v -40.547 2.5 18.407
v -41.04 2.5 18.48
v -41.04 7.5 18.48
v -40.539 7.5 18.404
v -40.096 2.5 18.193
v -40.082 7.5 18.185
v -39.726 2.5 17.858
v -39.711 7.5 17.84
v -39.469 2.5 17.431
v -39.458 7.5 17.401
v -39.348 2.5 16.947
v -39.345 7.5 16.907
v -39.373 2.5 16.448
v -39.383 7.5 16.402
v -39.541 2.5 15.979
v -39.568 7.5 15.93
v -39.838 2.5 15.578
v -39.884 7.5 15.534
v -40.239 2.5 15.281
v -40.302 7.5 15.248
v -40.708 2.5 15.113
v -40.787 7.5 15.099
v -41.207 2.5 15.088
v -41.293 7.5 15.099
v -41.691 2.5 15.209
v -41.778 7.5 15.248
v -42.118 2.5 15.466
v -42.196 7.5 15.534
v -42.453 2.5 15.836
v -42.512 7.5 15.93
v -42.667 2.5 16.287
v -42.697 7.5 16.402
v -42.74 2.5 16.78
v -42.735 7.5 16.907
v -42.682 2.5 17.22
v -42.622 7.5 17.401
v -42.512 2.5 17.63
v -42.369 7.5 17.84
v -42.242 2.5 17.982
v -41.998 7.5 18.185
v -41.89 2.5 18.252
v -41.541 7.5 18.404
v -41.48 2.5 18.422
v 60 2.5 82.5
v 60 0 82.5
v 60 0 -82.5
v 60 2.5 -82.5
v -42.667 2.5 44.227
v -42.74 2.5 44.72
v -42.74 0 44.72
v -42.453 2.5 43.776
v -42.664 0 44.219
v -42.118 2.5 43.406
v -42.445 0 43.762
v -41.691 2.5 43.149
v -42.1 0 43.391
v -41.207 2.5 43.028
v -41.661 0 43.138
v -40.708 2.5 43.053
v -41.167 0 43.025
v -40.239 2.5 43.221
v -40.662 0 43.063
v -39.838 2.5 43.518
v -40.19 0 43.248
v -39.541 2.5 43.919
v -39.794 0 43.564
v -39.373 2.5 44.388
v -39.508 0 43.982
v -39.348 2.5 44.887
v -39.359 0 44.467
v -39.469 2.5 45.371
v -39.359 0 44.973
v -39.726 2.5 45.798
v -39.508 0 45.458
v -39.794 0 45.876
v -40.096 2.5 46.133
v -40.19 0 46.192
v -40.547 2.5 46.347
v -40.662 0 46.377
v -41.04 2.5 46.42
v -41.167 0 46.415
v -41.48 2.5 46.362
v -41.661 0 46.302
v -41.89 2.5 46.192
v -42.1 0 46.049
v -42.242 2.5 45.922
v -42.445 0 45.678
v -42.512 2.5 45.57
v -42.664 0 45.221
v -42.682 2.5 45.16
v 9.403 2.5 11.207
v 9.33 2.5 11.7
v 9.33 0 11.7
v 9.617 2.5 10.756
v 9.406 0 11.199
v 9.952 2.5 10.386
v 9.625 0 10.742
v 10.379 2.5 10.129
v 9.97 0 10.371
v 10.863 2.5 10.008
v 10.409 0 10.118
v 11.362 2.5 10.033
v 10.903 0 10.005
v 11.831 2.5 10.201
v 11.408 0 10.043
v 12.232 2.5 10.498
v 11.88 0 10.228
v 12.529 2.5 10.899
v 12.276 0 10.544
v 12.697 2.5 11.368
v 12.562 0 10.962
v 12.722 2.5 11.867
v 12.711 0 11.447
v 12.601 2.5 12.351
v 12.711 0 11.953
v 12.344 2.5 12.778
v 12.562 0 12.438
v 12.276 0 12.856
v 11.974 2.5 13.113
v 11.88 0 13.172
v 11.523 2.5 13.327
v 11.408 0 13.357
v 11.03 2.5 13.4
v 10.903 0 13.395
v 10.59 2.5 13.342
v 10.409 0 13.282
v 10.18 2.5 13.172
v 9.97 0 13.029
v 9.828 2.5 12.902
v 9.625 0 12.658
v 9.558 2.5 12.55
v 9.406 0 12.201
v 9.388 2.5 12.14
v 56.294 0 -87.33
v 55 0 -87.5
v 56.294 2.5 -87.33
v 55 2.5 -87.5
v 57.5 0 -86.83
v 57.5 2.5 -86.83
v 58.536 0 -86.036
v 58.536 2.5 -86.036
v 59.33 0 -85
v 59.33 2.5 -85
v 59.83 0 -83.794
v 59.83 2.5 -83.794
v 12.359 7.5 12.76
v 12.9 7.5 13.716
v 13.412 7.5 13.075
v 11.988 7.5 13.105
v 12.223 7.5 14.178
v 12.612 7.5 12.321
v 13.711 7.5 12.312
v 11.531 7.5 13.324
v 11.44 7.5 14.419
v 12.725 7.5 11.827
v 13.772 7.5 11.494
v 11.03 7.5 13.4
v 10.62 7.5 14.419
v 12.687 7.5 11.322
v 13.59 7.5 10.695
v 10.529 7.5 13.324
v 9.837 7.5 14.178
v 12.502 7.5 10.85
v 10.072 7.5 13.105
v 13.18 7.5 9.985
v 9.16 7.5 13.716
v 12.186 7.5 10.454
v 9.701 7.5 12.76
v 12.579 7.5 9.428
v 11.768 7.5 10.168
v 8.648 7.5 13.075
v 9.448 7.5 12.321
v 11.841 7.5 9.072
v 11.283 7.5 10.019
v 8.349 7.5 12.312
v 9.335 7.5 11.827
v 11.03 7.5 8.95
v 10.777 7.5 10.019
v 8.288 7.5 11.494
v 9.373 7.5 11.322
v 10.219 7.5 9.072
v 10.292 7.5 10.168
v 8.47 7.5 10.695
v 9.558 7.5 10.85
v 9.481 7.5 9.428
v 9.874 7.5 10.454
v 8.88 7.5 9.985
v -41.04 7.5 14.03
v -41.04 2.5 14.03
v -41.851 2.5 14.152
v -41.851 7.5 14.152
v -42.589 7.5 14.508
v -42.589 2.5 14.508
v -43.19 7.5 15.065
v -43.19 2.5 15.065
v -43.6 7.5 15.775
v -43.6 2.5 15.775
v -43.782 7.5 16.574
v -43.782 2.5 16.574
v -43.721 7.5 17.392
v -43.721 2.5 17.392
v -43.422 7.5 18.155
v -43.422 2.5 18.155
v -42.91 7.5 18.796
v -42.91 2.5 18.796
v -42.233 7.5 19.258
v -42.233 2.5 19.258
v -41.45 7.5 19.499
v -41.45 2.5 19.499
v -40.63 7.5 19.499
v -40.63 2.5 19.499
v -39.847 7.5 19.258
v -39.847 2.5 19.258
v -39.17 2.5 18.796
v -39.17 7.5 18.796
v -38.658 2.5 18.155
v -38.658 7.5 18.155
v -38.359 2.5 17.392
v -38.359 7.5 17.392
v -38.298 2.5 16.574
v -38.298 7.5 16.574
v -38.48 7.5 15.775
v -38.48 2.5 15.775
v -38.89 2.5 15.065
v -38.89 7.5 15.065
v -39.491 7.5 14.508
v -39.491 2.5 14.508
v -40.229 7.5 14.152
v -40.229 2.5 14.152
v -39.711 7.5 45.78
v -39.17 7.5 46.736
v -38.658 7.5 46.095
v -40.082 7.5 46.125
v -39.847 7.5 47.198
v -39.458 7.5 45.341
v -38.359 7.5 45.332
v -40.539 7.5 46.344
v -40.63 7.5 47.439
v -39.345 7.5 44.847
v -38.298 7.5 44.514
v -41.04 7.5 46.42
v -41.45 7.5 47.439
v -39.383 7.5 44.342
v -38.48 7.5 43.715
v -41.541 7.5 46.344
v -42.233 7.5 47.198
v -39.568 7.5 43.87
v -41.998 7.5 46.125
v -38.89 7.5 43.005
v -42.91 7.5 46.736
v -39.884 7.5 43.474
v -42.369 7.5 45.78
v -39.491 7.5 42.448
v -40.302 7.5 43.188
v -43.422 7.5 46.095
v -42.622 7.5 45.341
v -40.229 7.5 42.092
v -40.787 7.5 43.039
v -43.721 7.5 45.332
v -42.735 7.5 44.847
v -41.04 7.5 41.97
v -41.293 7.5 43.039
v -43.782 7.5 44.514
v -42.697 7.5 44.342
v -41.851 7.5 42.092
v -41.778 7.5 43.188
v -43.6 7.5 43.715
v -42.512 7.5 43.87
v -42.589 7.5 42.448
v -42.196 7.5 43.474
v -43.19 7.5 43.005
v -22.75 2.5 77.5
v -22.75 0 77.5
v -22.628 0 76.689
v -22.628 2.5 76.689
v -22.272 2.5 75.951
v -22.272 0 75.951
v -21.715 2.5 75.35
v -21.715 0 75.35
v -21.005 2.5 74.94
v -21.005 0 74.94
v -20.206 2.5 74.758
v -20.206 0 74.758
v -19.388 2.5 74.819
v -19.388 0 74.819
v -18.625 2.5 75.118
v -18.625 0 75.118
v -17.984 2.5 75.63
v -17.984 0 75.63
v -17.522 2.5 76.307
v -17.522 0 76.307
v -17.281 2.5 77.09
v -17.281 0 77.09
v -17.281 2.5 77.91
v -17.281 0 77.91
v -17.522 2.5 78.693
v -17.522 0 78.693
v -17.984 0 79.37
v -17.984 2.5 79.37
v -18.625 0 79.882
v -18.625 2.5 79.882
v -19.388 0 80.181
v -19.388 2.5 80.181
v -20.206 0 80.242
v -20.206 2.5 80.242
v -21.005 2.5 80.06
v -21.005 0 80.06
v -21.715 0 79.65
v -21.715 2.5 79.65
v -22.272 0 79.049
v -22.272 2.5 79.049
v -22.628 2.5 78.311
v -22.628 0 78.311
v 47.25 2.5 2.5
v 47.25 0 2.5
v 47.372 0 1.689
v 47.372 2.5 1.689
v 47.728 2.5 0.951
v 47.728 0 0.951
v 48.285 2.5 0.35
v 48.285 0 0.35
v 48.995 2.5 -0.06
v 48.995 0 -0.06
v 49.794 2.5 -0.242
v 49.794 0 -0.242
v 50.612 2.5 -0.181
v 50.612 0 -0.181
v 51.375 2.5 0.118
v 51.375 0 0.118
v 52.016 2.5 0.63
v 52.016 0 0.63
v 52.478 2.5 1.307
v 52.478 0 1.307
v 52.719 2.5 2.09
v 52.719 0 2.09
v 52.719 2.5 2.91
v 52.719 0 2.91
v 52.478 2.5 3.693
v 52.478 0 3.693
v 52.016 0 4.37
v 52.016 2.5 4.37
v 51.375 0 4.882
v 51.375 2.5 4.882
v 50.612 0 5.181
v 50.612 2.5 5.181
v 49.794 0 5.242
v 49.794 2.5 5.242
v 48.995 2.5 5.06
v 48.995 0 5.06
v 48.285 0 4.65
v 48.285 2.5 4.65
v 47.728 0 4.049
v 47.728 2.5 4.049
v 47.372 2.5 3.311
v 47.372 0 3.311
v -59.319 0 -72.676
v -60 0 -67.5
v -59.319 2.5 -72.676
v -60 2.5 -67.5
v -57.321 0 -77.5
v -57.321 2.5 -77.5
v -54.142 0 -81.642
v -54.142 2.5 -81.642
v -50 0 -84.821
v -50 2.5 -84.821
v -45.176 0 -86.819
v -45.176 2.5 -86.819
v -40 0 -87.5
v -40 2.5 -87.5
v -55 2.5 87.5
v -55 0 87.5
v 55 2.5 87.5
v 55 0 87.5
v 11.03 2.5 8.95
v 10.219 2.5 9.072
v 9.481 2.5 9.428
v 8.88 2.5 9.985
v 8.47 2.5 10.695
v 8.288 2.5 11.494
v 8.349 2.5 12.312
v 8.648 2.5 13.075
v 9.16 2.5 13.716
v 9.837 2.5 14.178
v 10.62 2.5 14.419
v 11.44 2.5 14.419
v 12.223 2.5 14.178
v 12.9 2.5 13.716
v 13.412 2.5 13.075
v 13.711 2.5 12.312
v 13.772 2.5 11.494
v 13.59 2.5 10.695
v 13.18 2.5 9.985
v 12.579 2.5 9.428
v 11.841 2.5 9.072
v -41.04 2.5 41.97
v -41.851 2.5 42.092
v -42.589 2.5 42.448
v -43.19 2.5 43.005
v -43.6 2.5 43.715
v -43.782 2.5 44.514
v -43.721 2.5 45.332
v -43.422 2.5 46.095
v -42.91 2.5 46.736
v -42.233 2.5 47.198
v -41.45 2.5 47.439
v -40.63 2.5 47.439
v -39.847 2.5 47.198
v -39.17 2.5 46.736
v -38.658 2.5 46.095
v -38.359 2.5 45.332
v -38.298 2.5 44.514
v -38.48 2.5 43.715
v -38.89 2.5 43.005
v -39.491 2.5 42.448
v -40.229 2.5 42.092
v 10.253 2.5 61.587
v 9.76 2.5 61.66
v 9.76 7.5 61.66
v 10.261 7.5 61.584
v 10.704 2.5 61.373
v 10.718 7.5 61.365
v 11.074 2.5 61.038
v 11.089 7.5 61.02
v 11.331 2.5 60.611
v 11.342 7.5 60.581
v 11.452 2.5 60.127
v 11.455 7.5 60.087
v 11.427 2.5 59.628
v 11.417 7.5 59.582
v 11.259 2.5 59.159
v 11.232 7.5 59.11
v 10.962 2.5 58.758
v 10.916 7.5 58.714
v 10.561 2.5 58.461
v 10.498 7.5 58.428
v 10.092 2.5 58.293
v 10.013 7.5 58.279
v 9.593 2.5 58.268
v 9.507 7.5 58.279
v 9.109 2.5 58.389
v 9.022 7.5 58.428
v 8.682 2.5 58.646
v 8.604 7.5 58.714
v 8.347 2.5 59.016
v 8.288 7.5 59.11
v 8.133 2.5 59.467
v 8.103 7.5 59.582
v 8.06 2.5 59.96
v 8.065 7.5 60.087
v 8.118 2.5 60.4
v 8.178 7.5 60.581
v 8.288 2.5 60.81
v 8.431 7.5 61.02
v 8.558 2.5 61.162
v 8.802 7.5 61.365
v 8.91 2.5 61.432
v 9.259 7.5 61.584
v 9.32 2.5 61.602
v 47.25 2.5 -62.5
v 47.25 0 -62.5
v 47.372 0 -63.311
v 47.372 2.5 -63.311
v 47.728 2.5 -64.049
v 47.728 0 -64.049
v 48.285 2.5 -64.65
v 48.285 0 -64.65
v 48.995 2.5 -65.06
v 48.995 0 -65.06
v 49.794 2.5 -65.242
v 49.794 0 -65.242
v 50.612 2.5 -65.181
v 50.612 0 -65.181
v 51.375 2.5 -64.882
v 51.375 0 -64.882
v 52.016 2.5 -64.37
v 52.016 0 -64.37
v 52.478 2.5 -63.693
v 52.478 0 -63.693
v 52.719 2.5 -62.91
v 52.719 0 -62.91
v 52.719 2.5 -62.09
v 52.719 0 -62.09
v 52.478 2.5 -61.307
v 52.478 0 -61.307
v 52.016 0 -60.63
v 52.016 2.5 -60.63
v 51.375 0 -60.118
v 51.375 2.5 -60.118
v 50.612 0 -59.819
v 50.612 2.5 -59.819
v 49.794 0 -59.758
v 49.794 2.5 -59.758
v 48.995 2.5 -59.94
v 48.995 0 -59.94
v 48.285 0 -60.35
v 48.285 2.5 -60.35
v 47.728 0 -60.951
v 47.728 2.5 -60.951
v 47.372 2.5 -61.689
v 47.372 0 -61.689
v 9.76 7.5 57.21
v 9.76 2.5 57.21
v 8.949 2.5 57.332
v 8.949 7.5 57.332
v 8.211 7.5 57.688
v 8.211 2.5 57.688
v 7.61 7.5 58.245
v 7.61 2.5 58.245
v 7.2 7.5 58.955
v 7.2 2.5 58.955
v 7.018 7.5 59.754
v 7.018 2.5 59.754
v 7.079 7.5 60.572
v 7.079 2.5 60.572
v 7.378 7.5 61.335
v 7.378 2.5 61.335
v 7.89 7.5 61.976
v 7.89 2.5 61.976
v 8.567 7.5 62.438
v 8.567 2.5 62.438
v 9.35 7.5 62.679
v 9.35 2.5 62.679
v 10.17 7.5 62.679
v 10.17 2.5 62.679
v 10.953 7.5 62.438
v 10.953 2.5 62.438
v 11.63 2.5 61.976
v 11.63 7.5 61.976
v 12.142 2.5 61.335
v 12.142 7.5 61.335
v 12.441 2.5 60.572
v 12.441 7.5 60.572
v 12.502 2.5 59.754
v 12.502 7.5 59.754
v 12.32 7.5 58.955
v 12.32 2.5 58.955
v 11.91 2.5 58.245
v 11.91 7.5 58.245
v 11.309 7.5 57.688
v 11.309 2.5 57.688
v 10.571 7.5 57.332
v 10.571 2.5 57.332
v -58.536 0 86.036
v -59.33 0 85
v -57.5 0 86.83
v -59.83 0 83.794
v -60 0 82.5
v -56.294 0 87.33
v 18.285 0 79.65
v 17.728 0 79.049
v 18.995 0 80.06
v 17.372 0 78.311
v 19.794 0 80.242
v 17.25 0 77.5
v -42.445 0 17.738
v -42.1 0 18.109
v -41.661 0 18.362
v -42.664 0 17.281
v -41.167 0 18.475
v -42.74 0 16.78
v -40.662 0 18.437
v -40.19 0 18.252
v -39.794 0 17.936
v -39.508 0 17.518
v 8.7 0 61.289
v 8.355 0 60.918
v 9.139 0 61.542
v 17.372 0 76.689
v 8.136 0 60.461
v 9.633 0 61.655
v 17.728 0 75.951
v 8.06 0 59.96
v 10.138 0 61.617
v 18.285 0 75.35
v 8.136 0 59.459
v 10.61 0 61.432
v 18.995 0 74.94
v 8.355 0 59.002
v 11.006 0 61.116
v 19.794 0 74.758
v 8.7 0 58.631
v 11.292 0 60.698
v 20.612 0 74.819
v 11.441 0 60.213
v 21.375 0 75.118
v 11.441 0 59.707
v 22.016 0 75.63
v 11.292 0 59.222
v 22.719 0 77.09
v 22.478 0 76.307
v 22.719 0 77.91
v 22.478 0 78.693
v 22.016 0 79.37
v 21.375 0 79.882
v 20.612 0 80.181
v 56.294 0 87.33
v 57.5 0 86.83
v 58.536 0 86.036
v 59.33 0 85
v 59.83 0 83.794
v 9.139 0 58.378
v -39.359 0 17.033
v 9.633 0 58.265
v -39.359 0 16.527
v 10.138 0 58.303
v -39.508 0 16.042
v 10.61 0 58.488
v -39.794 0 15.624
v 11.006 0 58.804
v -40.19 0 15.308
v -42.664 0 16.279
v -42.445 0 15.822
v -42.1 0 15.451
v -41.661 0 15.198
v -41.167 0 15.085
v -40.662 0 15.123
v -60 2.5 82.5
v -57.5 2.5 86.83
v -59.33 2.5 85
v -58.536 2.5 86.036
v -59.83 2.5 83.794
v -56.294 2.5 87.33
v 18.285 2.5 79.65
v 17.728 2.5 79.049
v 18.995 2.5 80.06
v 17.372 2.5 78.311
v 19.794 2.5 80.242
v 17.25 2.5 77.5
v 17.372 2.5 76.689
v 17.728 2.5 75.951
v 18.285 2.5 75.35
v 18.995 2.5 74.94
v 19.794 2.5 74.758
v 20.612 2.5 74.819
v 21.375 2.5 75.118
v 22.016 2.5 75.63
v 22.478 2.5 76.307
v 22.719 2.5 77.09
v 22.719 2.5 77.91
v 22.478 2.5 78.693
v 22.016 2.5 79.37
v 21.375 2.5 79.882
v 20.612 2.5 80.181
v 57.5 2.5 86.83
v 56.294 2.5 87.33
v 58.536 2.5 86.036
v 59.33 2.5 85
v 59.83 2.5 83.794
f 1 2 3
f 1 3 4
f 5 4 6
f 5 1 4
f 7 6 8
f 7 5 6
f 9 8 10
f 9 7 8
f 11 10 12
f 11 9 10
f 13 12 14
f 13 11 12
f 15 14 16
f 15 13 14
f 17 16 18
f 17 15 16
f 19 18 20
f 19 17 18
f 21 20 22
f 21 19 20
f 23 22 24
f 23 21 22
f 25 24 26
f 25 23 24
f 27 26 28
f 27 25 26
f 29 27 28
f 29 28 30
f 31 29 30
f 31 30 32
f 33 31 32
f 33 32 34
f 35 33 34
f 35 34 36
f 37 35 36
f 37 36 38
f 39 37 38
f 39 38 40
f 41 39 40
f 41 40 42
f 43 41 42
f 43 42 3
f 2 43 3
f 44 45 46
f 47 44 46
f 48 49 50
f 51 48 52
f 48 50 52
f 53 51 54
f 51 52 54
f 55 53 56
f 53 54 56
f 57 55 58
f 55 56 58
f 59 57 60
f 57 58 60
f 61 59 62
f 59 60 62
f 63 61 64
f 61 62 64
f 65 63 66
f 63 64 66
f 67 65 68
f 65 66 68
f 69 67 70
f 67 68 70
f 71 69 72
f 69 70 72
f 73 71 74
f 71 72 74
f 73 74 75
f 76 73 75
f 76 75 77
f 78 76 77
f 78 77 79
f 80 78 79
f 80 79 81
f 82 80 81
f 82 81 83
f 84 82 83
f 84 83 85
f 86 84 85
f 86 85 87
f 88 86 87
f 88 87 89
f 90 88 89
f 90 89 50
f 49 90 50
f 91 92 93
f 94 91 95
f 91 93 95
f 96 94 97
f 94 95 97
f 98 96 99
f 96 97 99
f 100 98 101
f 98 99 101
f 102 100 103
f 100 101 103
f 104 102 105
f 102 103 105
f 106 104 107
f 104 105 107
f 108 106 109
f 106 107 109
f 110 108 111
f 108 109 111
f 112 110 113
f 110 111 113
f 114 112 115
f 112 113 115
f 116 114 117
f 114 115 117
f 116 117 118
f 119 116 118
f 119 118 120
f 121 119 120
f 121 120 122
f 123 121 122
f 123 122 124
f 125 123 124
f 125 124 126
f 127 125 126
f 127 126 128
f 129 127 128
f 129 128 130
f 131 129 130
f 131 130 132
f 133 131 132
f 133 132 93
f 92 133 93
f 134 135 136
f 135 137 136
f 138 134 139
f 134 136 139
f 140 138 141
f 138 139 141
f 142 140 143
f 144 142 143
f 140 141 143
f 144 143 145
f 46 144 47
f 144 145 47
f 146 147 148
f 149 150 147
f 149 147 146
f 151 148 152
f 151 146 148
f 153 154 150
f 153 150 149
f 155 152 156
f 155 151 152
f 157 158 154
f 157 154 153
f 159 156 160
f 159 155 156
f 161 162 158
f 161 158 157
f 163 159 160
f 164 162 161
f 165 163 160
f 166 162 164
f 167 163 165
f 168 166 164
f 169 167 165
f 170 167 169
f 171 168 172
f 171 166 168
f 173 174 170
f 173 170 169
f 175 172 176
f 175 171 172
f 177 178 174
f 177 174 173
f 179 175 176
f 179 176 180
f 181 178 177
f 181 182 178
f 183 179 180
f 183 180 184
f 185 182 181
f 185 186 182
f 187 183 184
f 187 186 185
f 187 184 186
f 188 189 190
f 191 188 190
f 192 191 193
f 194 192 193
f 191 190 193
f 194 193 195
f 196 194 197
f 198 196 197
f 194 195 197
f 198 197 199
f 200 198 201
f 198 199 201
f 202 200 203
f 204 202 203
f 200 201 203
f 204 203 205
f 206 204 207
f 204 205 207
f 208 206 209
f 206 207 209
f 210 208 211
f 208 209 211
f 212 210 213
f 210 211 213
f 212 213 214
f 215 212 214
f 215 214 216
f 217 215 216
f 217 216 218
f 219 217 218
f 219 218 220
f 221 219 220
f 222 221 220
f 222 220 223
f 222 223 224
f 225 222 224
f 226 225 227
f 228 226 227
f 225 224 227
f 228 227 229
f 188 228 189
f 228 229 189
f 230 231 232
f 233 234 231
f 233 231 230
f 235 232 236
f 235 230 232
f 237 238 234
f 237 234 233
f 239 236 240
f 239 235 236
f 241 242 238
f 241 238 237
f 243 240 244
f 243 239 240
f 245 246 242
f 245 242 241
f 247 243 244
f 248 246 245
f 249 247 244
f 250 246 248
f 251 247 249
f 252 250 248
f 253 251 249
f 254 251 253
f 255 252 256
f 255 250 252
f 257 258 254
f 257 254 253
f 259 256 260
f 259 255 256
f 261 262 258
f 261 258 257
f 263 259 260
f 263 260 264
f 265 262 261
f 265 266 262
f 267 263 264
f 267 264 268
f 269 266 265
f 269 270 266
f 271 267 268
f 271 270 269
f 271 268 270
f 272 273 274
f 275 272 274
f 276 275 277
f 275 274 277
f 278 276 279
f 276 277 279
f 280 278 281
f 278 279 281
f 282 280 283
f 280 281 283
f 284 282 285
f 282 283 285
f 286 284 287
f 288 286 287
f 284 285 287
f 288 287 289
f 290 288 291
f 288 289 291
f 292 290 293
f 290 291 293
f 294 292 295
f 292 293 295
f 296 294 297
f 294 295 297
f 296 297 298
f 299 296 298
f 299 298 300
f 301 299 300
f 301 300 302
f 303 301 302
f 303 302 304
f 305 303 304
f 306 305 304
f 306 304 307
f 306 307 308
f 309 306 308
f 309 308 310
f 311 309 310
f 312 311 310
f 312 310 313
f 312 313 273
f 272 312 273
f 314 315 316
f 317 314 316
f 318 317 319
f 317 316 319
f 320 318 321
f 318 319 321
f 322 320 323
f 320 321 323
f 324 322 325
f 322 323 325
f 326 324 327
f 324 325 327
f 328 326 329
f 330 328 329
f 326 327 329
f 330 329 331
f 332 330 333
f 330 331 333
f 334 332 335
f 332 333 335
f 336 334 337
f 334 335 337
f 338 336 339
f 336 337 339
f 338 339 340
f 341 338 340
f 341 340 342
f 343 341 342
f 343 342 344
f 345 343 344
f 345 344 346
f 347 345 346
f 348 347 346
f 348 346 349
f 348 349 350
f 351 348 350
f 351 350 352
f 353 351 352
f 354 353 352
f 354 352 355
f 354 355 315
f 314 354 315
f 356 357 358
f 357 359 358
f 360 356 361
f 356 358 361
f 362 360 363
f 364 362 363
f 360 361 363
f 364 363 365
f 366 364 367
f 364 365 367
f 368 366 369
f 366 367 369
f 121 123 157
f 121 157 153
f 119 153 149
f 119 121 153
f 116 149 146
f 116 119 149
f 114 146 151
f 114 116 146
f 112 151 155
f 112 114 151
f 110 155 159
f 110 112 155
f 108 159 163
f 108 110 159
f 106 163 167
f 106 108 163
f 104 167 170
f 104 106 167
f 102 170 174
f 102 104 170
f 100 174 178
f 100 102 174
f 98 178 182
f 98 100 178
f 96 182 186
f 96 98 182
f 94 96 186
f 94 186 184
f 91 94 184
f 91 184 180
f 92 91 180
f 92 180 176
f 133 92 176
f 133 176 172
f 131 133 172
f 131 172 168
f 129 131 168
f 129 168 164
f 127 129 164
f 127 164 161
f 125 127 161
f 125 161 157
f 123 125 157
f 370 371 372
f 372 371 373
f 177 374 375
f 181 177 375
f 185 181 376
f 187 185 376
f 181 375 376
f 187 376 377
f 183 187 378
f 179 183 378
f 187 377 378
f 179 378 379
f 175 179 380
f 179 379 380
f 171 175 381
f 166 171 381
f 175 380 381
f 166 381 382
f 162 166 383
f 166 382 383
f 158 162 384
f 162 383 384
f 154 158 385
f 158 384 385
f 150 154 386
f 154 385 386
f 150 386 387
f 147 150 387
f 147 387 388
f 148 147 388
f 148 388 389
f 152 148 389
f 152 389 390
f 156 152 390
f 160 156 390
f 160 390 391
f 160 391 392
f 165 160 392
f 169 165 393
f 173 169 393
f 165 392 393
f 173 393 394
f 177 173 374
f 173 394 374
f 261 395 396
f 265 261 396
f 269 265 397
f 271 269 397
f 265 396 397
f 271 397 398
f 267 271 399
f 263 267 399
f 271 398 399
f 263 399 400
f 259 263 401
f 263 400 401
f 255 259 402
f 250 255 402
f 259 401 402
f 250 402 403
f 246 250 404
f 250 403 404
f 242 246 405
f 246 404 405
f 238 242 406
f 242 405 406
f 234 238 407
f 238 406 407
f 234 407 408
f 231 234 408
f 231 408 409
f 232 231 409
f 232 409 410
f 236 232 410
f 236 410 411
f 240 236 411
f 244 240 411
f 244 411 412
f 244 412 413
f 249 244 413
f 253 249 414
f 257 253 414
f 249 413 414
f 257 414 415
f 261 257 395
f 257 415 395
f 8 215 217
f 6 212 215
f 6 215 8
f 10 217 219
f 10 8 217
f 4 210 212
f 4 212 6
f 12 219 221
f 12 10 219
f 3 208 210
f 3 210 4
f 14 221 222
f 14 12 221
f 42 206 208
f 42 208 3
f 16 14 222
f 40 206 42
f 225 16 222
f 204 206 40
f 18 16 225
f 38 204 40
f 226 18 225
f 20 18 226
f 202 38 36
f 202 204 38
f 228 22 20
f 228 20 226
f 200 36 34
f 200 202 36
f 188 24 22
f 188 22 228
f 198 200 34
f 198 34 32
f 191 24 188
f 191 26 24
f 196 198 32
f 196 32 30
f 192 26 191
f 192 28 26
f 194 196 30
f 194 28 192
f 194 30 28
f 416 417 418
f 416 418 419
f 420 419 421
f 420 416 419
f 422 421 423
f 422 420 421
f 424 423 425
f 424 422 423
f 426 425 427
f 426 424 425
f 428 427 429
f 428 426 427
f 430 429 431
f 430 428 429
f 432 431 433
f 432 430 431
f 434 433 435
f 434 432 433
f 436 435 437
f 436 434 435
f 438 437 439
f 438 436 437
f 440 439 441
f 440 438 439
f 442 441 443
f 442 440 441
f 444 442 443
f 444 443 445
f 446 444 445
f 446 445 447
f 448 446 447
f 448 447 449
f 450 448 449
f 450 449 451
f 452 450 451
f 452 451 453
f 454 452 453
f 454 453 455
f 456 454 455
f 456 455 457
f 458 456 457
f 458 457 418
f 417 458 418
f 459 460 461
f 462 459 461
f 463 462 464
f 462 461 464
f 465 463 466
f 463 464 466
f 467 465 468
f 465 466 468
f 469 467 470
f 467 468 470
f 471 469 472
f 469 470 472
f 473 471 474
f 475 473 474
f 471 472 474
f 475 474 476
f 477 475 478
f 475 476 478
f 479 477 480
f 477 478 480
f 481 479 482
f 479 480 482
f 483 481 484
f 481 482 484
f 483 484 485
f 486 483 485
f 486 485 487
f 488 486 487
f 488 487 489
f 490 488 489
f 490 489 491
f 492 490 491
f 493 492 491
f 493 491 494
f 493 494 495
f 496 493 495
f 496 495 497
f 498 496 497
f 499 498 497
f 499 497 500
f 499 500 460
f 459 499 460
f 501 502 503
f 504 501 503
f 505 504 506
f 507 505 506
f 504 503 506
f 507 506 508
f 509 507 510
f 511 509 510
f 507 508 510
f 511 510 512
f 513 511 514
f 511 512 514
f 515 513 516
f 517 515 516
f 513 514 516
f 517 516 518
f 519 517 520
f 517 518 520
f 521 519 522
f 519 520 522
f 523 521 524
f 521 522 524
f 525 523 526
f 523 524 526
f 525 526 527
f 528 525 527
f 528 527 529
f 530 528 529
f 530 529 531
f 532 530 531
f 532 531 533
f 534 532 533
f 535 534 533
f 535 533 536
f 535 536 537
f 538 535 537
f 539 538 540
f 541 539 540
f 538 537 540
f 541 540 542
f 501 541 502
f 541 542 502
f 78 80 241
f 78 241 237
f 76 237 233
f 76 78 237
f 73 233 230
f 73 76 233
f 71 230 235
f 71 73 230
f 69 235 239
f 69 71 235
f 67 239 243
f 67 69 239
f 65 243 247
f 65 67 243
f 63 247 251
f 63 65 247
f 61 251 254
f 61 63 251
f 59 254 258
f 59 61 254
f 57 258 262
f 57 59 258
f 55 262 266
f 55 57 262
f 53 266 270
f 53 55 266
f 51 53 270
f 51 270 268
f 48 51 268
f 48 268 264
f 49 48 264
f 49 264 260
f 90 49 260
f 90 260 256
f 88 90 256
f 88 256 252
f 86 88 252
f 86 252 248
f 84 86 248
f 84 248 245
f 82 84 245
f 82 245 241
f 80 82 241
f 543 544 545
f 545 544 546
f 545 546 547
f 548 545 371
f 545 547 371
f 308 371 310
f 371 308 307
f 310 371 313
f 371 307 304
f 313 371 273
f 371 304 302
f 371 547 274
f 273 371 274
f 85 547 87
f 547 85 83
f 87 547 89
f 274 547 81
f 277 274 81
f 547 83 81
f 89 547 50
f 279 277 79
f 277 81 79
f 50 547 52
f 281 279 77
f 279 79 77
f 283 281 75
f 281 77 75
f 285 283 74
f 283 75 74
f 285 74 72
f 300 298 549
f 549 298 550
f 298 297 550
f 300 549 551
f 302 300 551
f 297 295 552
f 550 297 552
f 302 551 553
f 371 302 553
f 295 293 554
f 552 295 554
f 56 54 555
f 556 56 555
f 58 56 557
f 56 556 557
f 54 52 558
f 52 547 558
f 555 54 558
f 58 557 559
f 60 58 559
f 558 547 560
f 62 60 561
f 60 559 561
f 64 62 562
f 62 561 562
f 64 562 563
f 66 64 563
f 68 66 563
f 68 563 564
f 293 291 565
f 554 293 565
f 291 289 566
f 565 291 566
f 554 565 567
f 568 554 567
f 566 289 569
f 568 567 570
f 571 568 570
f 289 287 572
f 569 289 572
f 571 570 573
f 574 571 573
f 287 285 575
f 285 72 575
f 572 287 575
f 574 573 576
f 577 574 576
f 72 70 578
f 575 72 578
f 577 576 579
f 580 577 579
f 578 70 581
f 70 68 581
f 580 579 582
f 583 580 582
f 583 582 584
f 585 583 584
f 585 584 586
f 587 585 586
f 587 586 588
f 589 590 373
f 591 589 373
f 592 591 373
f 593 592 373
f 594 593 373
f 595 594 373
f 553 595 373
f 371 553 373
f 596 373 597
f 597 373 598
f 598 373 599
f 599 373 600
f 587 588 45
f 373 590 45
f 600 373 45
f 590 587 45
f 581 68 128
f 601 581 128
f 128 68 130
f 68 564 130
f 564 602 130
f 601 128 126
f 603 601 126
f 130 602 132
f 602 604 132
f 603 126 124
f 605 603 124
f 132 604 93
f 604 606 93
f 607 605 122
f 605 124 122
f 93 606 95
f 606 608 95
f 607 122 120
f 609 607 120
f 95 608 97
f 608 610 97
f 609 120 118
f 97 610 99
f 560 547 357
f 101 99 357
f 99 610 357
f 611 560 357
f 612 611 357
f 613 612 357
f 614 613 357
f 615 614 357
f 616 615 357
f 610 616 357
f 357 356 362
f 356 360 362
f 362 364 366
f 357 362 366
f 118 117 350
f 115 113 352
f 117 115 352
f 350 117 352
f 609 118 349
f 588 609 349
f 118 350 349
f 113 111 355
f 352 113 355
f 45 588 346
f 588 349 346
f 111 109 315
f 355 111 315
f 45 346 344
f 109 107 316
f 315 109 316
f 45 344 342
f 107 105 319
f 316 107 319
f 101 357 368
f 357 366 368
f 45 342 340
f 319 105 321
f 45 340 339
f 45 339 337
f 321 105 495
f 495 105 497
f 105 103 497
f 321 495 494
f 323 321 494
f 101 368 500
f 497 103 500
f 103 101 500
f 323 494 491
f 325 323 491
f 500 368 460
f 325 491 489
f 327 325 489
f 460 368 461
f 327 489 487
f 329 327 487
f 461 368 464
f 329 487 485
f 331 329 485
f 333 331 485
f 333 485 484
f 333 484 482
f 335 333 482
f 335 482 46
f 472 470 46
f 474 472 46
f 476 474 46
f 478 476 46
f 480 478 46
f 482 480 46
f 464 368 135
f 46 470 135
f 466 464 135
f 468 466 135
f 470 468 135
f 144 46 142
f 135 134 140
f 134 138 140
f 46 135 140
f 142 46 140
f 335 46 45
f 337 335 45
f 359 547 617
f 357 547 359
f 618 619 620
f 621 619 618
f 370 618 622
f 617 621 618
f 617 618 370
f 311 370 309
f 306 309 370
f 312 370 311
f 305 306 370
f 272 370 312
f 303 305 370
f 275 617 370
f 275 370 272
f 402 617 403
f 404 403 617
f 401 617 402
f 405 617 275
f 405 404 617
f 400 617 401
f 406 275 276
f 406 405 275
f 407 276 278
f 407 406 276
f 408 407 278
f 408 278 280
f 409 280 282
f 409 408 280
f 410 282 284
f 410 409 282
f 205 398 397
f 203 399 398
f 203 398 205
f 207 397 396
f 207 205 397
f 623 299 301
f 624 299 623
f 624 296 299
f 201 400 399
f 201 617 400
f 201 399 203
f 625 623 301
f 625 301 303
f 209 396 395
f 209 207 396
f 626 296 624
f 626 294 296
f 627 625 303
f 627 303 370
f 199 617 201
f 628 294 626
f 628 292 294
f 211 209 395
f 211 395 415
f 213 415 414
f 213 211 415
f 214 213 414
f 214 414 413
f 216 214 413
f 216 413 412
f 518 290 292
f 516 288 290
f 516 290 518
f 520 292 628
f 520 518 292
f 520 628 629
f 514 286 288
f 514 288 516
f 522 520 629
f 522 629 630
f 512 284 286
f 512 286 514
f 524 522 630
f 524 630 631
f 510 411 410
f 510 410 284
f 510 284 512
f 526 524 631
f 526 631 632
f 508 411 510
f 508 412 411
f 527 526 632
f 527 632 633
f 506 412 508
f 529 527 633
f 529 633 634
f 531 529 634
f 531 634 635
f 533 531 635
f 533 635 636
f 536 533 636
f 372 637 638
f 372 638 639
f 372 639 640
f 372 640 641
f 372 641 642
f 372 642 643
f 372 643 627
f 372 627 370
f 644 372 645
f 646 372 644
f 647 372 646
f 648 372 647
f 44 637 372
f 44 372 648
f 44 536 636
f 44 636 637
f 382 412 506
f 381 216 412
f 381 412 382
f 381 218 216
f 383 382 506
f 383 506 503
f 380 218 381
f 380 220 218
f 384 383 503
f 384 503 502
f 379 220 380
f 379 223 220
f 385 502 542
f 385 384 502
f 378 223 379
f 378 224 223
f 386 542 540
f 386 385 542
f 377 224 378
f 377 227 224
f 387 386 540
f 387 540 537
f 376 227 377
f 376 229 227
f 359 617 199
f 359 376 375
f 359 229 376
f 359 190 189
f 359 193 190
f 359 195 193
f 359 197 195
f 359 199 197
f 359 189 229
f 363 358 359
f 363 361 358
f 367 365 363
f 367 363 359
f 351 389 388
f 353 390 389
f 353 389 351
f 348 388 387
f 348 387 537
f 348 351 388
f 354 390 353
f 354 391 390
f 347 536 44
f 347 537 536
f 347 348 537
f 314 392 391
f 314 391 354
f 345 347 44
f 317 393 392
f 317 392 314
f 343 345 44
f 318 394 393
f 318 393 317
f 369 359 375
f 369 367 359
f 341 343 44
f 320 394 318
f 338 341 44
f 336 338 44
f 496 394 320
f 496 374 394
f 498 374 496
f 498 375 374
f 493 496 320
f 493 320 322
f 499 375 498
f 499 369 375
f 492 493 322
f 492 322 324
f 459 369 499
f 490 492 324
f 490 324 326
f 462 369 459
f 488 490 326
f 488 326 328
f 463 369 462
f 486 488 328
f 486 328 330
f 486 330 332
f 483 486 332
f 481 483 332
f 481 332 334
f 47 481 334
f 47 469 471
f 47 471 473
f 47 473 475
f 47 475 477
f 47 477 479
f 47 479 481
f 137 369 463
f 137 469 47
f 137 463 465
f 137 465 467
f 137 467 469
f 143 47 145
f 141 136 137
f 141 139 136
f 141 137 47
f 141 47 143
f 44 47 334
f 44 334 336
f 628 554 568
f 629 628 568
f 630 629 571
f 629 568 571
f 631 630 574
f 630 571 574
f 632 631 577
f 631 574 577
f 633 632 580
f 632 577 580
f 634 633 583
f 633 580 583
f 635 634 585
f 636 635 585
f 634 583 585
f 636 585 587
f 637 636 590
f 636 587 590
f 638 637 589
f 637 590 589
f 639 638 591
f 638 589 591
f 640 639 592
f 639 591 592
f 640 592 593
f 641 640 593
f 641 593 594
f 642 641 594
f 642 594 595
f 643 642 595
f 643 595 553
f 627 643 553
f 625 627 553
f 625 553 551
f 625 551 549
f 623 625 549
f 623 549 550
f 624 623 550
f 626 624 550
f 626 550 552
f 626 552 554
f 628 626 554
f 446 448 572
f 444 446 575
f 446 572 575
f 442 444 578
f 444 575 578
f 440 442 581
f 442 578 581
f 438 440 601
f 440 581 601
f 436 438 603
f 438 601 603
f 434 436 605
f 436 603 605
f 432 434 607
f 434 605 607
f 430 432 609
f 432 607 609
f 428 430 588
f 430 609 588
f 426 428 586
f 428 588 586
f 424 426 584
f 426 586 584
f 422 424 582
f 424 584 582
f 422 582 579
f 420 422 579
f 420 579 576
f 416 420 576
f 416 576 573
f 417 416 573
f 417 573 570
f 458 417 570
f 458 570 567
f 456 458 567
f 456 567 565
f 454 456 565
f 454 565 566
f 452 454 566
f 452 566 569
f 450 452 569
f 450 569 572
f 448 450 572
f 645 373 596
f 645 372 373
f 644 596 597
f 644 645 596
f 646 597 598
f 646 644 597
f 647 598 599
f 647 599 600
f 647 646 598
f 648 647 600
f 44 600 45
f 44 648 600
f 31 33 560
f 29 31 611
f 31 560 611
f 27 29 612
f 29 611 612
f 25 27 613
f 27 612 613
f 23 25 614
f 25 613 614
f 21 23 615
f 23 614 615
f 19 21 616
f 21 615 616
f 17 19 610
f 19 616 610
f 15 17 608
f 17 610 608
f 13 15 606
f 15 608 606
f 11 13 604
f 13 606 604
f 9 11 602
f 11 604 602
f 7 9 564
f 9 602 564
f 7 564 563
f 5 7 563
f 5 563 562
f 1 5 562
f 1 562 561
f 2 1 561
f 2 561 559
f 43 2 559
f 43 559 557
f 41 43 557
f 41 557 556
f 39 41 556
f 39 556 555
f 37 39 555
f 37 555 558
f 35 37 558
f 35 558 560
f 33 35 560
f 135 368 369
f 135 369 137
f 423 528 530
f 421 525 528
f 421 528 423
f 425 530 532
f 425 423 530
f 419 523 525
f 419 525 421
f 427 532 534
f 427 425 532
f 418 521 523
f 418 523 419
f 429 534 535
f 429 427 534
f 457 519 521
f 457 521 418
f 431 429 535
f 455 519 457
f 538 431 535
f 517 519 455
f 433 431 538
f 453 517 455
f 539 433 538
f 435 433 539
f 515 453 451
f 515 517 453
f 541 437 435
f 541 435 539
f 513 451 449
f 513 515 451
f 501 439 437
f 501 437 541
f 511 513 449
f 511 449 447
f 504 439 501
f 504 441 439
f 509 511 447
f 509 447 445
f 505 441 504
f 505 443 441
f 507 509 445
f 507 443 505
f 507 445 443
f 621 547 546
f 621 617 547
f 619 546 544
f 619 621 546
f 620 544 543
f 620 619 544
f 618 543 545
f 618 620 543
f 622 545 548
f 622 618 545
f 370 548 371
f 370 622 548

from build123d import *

# Parameters (mm, degrees)
SKETCH1_W            = 120
SKETCH1_H            = 175
BOSS_EXTRUDE1_DEPTH  = 2.5
M5_CLEARANCE_HOLE1_D = 5.5
M3_CLEARANCE_HOLE2_D = 3.4
FILLET1_R            = 20
FILLET2_R            = 5
SKETCH11_R           = 2.750000000000002
SKETCH11_R_2         = 1.699999999999985
BOSS_EXTRUDE3_DEPTH  = 5


with BuildPart() as part:
    # Sketch1 → Boss-Extrude1 (new body)
    with BuildSketch(Plane(origin=(0, 0, 0), x_dir=(1, 0, 0), z_dir=(0, 1, 0))):
        Rectangle(SKETCH1_W, SKETCH1_H)
    extrude(amount=BOSS_EXTRUDE1_DEPTH)

    # M5 Clearance Hole1 (through all)
    with Locations(Plane(origin=(0, 2.5, 0), x_dir=(1, 0, 0), z_dir=(0, 1, 0))):
        with Locations((50, 62.5), (50, -2.5), (-20, -77.5), (20, -77.5)):
            Hole(M5_CLEARANCE_HOLE1_D / 2)

    # M3 Clearance Hole2 (through all)
    with Locations(Plane(origin=(0, 2.5, 0), x_dir=(1, 0, 0), z_dir=(0, 1, 0))):
        with Locations((9.76, -59.96), (11.03, -11.7), (-41.04, -44.72), (-41.04, -16.78)):
            Hole(M3_CLEARANCE_HOLE2_D / 2)

    # Fillet1
    fillet1_edges = [part.edges().sort_by_distance(p)[0] for p in [
        (-59.99999999999998, 1.25, -87.50000000000001),
    ]]
    fillet(fillet1_edges, radius=FILLET1_R)

    # Fillet2
    fillet2_edges = [part.edges().sort_by_distance(p)[0] for p in [
        (60.00000000000002, 1.25, 87.49999999999999),
        (-59.99999999999998, 1.25, 87.49999999999999),
        (60.00000000000002, 1.25, -87.50000000000001),
    ]]
    fillet(fillet2_edges, radius=FILLET2_R)

    # Sketch11 → Boss-Extrude3 (add)
    with BuildSketch(Plane(origin=(0, 2.5, 0), x_dir=(1, 0, 0), z_dir=(0, 1, 0))):
        with Locations(Location((-41.039999999999964, -16.779999999999983, 0), (0, 0, 90))):
            Circle(SKETCH11_R)
        with Locations(Location((-41.039999999999964, -16.779999999999983, 0), (0, 0, 270))):
            Circle(SKETCH11_R_2, mode=Mode.SUBTRACT)
    boss_extrude3 = extrude(amount=BOSS_EXTRUDE3_DEPTH)

    # Sketch-Pattern2: Boss-Extrude3 at 3 more places
    with Locations((50.8, 0, 43.18), (52.07, 0, -5.08), (0, 0, 27.94)):
        add(boss_extrude3)


solid = part.part
